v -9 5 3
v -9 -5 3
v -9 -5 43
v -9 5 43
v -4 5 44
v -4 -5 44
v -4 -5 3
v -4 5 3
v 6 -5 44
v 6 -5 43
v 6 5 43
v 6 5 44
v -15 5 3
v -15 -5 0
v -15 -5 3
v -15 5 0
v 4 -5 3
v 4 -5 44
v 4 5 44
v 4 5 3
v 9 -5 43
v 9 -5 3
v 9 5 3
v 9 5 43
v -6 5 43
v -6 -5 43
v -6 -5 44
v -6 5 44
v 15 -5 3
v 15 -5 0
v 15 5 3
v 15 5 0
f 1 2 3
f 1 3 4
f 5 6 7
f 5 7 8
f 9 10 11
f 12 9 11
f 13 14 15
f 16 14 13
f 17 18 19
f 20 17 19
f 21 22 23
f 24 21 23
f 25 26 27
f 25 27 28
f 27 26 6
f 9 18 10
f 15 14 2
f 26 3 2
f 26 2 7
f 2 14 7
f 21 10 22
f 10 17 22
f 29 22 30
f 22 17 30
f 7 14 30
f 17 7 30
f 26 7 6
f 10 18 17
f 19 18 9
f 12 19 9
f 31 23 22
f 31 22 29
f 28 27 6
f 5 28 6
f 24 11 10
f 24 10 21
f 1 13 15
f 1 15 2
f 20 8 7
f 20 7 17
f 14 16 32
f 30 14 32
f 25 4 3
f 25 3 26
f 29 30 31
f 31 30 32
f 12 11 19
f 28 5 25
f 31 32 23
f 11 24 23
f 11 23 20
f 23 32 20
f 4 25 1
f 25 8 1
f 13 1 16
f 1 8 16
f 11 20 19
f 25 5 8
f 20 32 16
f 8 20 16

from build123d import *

# Parameters (mm, degrees)
F0_W     = 6
F0_H     = 10
F0_W_2   = 3
F0_W_3   = 2
F0_W_4   = 8
F1_DEPTH = 3
F2_DEPTH = 43
F3_DEPTH = 44


with BuildPart() as f1:
    # F0 (on Top) → F1 (new body)
    with BuildSketch(Plane.XY):
        with Locations((-12, 0)):
            Rectangle(F0_W, F0_H)
        with Locations((-7.5, 0)):
            Rectangle(F0_W_2, F0_H)
        with Locations((-5, 0)):
            Rectangle(F0_W_3, F0_H)
        Rectangle(F0_W_4, F0_H)
        with Locations((5, 0)):
            Rectangle(F0_W_3, F0_H)
        with Locations((7.5, 0)):
            Rectangle(F0_W_2, F0_H)
        with Locations((12, 0)):
            Rectangle(F0_W, F0_H)
    extrude(amount=F1_DEPTH)

    # F0 (on Top) → F2 (join)
    with BuildSketch(Plane.XY):
        with Locations((7.5, 0)):
            Rectangle(F0_W_2, F0_H)
        with Locations((-7.5, 0)):
            Rectangle(F0_W_2, F0_H)
    extrude(amount=F2_DEPTH)

    # F0 (on Top) → F3 (join)
    with BuildSketch(Plane.XY):
        with Locations((-5, 0)):
            Rectangle(F0_W_3, F0_H)
        with Locations((5, 0)):
            Rectangle(F0_W_3, F0_H)
    extrude(amount=F3_DEPTH)


solid = f1.part
